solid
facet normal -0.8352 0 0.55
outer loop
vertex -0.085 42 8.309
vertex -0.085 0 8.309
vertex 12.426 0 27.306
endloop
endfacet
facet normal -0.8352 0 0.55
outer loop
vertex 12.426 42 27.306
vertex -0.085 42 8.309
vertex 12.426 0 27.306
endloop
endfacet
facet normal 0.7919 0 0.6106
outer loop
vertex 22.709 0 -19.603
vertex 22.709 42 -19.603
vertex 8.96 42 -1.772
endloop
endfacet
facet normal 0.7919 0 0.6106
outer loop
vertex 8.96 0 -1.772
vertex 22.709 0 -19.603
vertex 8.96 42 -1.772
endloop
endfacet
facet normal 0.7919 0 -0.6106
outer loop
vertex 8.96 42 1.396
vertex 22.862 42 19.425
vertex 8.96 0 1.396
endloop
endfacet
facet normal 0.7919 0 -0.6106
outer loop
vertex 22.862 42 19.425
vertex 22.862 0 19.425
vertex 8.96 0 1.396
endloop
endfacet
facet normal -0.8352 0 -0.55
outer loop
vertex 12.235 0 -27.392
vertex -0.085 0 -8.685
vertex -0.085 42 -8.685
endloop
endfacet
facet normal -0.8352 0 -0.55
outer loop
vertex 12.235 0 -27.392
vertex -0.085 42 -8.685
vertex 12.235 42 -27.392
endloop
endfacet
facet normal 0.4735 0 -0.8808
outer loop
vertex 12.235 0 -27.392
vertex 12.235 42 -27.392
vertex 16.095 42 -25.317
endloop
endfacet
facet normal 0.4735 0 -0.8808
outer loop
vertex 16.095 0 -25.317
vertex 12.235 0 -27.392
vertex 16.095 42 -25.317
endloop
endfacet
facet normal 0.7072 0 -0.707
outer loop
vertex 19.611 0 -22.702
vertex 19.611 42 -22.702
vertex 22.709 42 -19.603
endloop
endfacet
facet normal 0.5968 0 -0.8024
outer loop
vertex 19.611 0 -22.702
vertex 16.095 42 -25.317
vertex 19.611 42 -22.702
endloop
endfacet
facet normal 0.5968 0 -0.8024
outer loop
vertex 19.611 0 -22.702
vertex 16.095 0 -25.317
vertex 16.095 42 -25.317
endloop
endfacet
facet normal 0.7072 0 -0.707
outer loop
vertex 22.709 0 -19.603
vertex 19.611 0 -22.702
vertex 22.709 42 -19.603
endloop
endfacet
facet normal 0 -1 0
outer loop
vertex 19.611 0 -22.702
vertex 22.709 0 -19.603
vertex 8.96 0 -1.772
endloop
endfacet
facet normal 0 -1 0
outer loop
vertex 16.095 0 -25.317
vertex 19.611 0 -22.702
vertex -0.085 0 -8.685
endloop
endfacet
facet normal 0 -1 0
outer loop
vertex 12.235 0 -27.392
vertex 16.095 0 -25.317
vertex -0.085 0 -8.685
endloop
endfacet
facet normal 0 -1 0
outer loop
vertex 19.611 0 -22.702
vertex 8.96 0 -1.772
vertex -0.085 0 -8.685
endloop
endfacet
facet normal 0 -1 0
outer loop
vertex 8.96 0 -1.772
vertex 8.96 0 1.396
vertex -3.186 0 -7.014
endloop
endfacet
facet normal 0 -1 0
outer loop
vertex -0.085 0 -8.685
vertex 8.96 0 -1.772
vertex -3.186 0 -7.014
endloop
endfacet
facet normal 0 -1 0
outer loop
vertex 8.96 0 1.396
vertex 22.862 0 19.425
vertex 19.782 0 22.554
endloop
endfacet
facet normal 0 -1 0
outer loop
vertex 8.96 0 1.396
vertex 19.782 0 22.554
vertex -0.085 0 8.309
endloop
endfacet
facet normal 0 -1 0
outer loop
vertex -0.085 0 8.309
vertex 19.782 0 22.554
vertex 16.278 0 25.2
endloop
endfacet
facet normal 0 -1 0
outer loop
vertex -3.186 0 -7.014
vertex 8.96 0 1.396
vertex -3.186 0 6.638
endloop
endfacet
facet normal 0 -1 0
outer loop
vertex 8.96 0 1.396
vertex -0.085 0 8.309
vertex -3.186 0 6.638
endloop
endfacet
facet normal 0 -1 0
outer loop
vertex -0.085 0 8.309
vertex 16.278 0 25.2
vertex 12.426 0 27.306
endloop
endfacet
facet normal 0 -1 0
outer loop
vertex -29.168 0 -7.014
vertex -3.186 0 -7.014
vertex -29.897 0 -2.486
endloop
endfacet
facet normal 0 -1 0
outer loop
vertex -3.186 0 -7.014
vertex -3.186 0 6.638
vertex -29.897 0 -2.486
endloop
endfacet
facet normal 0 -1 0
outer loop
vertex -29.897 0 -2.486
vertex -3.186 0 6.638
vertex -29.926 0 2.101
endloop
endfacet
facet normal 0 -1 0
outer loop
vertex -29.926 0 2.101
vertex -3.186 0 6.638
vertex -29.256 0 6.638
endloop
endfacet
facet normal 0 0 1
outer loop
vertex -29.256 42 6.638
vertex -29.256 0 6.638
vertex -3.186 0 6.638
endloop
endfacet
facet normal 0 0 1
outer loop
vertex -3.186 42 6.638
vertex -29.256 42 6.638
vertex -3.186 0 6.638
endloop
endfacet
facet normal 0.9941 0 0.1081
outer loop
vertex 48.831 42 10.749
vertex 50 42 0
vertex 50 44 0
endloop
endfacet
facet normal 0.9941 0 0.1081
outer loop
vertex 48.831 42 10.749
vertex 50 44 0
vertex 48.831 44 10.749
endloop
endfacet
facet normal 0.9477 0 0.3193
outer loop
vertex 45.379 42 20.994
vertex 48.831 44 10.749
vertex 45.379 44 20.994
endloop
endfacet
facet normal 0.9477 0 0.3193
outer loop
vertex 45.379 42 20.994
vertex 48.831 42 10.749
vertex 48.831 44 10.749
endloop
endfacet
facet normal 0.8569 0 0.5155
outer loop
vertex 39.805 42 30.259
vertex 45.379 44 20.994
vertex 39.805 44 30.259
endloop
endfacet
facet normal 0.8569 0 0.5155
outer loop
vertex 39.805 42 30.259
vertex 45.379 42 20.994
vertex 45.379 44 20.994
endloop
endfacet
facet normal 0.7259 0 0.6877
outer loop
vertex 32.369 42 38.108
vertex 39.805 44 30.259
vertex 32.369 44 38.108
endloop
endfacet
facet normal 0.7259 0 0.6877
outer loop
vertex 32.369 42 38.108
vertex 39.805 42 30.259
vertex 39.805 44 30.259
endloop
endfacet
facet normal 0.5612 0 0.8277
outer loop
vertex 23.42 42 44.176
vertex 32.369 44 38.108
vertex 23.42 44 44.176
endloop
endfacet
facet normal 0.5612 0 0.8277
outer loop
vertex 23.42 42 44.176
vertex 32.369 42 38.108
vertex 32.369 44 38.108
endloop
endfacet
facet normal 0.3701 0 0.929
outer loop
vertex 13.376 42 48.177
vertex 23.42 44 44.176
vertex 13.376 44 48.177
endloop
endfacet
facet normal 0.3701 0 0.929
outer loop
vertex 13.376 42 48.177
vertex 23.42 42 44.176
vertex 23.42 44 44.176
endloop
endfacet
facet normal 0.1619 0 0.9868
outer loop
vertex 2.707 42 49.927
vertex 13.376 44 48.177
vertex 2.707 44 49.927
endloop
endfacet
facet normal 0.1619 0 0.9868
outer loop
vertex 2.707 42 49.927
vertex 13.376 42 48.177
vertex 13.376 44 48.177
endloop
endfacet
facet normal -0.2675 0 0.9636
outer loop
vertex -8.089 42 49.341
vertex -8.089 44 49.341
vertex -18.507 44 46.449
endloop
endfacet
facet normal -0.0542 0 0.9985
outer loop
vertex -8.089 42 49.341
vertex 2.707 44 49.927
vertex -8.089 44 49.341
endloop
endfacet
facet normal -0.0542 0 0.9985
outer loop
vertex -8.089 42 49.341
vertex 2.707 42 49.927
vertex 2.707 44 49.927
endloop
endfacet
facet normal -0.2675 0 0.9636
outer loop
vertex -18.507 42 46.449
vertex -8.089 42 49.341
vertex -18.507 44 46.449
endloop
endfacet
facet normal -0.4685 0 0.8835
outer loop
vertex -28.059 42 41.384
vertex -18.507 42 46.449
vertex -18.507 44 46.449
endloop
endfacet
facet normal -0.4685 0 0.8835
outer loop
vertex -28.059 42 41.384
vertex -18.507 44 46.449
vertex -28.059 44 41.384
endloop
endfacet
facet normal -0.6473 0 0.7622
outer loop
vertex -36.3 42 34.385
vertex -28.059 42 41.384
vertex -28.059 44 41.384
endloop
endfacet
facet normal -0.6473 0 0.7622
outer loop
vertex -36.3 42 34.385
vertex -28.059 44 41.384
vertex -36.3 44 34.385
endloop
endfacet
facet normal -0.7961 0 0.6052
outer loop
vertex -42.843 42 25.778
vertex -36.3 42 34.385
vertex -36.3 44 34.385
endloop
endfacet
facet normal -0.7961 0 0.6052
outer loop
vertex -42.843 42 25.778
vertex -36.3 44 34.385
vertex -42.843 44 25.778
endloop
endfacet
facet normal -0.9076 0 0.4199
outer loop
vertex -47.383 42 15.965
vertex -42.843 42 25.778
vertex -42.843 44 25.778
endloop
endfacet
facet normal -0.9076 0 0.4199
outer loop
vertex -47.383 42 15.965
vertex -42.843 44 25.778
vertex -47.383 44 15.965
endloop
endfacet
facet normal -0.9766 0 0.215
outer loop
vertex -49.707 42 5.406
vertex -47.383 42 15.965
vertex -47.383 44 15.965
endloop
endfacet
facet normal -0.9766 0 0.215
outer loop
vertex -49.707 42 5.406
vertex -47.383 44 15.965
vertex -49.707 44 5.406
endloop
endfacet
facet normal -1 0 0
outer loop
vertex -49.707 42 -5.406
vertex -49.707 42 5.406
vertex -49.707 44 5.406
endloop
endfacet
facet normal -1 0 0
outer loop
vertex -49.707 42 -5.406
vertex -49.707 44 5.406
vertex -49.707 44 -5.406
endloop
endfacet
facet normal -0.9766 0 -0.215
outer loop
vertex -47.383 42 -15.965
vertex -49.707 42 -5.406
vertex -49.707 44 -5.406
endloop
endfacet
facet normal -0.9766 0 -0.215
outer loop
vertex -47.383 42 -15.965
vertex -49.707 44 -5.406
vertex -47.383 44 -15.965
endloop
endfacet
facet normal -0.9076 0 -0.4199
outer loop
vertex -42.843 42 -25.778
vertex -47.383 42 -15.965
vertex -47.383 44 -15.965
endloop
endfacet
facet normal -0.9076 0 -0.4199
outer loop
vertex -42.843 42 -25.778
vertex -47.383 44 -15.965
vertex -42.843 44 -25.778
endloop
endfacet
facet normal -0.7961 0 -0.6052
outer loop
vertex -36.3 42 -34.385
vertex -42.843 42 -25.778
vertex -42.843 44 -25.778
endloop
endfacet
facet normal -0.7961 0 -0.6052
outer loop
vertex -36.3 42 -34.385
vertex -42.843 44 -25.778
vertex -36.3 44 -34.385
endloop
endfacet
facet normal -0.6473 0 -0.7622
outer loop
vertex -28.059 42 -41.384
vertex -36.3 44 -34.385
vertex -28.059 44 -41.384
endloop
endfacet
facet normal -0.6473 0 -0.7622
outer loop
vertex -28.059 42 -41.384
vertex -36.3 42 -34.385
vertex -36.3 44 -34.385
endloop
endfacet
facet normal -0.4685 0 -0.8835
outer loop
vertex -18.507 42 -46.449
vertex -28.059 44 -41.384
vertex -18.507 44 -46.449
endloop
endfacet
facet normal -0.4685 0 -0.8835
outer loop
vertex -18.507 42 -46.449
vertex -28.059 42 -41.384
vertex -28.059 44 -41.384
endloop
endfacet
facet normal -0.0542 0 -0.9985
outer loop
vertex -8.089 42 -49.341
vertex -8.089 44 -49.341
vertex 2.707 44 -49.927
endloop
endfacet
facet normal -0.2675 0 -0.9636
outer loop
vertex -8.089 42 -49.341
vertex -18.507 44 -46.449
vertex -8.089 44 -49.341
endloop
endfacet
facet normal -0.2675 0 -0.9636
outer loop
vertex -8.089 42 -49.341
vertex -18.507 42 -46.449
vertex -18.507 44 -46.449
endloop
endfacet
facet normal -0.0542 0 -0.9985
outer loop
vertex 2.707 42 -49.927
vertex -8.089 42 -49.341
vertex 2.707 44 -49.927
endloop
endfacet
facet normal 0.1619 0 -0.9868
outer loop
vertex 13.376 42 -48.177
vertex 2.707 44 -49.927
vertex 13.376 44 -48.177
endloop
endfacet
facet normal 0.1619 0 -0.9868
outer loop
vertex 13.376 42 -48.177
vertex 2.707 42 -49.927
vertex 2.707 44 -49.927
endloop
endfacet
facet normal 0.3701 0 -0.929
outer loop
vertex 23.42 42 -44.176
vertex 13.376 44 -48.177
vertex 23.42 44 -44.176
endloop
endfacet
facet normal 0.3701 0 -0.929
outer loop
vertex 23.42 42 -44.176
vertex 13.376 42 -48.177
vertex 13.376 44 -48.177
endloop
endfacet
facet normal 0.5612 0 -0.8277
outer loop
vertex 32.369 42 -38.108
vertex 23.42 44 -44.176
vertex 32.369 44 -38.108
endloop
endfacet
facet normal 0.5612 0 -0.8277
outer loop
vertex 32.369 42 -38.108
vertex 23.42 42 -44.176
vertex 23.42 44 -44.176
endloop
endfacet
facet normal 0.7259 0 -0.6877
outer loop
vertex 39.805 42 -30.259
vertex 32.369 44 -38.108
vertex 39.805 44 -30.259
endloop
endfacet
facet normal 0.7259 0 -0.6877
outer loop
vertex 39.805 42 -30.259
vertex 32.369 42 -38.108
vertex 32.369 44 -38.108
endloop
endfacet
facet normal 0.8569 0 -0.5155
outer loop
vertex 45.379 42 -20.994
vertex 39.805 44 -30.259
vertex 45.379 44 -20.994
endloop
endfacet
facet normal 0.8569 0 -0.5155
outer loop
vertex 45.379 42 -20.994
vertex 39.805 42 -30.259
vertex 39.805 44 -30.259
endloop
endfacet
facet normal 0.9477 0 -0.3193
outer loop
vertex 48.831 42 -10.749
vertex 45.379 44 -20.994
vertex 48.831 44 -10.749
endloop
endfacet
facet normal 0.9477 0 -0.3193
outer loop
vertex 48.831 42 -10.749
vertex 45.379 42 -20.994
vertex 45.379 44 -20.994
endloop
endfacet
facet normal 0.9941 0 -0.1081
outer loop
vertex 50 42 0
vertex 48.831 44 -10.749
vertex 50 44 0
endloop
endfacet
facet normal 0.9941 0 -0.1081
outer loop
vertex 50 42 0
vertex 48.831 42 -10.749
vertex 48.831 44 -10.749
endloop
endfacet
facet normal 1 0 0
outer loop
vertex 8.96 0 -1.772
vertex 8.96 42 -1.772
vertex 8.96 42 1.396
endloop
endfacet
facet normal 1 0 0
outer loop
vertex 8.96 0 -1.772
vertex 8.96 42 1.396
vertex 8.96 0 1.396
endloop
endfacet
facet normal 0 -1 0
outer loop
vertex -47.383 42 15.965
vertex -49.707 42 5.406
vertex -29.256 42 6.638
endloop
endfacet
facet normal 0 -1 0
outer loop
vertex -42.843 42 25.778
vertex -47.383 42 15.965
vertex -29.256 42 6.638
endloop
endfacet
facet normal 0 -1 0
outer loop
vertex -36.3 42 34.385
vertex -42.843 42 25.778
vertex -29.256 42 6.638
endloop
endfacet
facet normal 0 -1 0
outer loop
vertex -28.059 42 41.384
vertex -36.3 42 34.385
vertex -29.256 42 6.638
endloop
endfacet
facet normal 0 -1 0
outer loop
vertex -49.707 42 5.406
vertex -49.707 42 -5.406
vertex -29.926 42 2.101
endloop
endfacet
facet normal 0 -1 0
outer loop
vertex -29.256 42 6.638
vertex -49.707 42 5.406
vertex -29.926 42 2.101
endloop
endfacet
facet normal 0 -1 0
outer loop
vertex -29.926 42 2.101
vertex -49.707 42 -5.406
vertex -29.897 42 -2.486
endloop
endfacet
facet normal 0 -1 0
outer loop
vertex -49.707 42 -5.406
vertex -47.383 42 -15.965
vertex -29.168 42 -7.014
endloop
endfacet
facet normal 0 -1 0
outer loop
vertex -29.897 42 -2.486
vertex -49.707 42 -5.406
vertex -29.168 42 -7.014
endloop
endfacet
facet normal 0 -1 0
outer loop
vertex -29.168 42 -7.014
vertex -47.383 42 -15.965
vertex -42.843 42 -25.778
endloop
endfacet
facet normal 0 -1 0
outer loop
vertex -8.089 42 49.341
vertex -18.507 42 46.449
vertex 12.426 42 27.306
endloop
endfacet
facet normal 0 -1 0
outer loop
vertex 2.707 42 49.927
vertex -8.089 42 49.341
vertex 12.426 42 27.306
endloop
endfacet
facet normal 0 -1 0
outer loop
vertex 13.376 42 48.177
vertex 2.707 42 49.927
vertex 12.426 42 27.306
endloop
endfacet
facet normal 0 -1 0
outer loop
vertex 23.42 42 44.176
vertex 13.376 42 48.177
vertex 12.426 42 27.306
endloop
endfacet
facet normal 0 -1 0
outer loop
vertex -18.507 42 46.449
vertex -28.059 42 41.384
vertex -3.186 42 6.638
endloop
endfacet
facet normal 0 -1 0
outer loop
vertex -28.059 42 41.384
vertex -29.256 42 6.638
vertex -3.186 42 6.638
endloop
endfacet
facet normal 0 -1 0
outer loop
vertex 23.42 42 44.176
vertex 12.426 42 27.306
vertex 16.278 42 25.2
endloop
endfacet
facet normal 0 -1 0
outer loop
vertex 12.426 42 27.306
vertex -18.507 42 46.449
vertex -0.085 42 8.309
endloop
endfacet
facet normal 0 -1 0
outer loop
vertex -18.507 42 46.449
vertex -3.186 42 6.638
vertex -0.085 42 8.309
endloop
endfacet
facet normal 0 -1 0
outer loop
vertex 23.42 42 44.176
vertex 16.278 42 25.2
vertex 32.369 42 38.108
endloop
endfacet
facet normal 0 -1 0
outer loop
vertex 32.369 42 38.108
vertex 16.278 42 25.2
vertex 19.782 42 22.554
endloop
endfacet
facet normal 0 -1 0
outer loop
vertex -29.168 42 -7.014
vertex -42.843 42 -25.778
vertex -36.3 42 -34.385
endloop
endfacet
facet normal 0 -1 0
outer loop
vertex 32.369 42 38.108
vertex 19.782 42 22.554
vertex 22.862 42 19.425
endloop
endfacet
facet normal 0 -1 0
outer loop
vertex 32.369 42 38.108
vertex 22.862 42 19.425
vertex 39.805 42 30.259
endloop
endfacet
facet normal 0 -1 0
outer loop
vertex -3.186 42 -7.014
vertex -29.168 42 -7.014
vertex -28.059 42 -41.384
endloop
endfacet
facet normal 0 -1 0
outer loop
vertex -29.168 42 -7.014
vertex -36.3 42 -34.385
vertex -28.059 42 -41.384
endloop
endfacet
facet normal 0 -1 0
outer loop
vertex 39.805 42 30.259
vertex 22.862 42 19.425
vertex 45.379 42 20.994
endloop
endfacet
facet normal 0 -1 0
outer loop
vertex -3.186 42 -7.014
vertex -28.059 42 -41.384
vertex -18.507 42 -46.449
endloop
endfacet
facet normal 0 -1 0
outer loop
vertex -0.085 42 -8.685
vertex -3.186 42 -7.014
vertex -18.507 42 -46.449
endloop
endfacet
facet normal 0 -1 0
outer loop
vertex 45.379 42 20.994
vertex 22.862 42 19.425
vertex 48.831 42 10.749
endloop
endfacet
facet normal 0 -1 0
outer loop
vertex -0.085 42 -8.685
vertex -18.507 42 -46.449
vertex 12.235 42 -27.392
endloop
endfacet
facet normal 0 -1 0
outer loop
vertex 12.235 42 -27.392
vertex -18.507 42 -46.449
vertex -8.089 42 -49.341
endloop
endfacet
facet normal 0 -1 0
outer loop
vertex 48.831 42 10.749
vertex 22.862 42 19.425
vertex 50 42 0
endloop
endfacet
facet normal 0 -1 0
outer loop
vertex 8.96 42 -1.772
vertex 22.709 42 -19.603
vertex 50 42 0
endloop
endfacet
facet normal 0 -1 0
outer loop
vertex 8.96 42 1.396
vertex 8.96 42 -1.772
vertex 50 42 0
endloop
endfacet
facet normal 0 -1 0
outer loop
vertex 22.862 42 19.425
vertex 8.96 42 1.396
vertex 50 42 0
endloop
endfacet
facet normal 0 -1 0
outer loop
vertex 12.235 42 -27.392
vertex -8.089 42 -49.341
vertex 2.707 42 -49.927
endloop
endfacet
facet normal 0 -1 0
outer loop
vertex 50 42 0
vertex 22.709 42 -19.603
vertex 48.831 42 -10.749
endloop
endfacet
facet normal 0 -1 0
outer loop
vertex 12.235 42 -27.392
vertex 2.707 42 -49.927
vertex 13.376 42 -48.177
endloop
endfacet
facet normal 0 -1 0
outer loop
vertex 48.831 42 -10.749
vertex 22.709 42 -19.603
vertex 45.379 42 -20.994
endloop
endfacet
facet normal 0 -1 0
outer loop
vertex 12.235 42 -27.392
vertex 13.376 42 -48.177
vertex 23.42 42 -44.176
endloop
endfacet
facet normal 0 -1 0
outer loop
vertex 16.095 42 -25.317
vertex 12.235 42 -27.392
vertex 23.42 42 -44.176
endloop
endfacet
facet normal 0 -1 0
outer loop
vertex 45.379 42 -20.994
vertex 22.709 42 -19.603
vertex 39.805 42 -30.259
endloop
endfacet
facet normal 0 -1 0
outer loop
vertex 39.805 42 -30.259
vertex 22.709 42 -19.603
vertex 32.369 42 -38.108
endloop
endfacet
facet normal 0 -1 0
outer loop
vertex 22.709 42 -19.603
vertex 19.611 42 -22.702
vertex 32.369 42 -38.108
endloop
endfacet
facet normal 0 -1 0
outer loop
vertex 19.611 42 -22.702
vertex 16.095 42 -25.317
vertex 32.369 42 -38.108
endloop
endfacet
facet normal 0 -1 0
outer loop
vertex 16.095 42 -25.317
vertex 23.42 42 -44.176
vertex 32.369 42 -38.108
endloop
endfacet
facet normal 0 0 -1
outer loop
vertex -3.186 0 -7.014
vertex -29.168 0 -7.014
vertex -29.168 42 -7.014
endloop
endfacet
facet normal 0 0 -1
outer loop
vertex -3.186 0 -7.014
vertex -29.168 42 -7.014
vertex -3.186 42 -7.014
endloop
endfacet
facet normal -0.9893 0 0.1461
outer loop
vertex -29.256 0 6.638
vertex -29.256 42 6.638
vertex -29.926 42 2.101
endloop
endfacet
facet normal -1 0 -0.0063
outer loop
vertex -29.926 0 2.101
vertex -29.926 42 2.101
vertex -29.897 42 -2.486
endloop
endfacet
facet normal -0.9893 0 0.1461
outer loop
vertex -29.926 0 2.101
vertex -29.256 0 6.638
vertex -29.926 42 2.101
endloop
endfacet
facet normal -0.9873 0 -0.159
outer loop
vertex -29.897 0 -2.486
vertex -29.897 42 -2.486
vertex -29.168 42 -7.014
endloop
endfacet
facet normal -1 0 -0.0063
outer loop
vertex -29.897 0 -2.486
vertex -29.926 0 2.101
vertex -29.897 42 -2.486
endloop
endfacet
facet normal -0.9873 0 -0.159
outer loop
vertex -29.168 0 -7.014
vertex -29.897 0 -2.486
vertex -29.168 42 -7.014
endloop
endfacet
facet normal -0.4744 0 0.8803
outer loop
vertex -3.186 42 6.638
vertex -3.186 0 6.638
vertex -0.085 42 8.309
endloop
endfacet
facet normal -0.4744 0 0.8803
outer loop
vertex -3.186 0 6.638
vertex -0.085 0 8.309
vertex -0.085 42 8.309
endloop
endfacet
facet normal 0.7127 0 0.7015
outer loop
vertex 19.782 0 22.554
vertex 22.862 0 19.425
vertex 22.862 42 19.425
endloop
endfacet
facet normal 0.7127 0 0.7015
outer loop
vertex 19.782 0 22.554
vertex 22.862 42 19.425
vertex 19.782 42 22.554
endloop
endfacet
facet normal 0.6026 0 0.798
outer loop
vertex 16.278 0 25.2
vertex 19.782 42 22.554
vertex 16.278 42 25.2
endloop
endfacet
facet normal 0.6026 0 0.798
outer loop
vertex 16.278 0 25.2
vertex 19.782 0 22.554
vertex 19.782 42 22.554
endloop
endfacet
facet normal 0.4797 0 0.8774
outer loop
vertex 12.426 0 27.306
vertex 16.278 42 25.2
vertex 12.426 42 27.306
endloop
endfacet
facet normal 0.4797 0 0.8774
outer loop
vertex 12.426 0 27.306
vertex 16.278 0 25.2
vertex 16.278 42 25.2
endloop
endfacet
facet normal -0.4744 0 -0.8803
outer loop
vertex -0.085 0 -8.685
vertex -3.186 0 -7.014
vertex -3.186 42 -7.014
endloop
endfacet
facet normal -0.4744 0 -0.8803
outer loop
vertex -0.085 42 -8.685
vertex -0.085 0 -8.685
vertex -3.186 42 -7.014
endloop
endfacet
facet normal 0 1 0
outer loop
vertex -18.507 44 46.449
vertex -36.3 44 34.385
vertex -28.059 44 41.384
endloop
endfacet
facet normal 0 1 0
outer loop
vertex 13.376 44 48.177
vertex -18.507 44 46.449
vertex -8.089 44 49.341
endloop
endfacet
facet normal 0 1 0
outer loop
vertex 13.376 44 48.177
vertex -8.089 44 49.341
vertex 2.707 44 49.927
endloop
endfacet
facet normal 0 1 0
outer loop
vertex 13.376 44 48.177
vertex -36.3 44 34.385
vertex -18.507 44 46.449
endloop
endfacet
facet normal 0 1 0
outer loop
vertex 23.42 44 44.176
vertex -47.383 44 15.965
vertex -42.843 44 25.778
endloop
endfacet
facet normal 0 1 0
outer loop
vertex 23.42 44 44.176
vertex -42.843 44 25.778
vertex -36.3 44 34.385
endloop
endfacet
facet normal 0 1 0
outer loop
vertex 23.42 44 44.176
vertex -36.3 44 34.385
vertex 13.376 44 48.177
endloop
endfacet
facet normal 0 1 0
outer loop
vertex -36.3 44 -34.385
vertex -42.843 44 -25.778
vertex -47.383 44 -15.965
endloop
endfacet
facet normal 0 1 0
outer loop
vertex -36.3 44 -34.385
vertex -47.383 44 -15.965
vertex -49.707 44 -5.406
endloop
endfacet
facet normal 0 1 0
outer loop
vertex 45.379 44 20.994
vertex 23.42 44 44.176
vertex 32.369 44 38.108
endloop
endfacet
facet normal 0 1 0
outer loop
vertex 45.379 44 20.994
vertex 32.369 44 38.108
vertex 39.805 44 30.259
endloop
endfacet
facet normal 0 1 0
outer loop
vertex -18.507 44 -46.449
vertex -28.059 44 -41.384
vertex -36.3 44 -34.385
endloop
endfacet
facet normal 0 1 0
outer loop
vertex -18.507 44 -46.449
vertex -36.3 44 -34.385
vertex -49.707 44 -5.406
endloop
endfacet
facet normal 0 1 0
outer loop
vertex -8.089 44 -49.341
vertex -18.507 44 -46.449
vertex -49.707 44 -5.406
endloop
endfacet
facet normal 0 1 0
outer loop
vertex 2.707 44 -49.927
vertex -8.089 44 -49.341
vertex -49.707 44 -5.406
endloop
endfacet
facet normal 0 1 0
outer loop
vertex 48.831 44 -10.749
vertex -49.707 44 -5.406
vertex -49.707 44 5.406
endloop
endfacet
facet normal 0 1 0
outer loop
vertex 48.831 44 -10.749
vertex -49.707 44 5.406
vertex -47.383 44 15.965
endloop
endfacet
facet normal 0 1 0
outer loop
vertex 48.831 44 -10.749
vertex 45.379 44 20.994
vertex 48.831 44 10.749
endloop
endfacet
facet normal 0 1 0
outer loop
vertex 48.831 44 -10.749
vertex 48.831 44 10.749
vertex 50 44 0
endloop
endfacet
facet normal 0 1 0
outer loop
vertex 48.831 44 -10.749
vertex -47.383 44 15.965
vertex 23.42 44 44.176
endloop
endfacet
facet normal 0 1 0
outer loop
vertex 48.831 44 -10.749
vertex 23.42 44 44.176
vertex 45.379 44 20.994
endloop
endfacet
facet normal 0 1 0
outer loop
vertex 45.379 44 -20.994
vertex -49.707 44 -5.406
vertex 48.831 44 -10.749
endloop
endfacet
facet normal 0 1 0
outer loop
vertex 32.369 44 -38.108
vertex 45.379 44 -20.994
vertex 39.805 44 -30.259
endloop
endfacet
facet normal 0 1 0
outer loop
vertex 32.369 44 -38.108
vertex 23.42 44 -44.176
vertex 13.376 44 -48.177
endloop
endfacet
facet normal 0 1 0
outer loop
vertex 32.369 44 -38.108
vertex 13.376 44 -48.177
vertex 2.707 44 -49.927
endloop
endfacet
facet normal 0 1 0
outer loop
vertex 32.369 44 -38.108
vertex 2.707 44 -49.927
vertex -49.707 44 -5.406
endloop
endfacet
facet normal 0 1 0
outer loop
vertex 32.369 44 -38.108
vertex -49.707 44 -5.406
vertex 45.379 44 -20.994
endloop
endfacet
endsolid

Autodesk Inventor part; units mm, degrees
ref_plane "YZ Plane" through (0, 0, 0) normal (1, 0, 0) x (0, 1, 0)
ref_plane "XZ Plane" through (0, 0, 0) normal (0, 1, 0) x (-1, 0, 0)
ref_plane "XY Plane" through (0, 0, 0) normal (0, 0, 1) x (1, 0, 0)
sketch "Esboço1" plane through (0, 0, 0) normal (0, 1, 0) x (-1, 0, 0)
  circle A0 centre (0, 0) radius 30
  line L0 (29.2563, 6.6384) -> (1.1855, 6.6384)
  line L1 (1.1855, 6.6384) -> (-12.4256, 27.3058)
  line L2 (-22.8619, 19.4251) -> (-7.7387, -0.1879)
  line L3 (29.9994, -0.1879) -> (-29.9994, -0.1879) construction
  line L4 (29.2563, -7.0142) -> (1.1855, -7.0142)
  line L5 (1.1855, -7.0142) -> (-12.4256, -27.6816)
  line L6 (-22.8619, -19.8009) -> (-7.7387, -0.1879)
  point P0 (29.2563, -6.6384)
  point P1 (-23.0884, -19.1553)
  point P2 (-22.7094, -19.6031)
  point P3 (29.1685, -7.0142)
  point P4 (-12.2347, -27.3918)
  dimension "d0" = 60
extrude "Extrusão1" add sketch "Esboço1" along normal blind 42 contours A0 L4 L5 L6 L2 L1 L0
sketch "Esboço2" plane through (0, 42, 0) normal (0, 1, 0) x (1, 0, 0)
  circle A0 centre (0, 0) radius 50
  dimension "d3" = 100
extrude "Extrusão2" add sketch "Esboço2" along normal blind 2
chamfer "Chanfro1" distance 2 angle 45 3 edges at (-1.1855, 21, -7.0142) (-1.1855, 21, 6.6384) (7.7387, 21, -0.1879)
sketch "Esboço3" plane through (12.2347, 0, -27.3918) normal (-0.8352, 0, -0.55) x (-0.55, 0, 0.8352)
  line L0 (23.1979, 0) -> (0.7435, 0) projected
  line L1 (79.6057, 44) -> (-20.3943, 44) projected
  point P0 (29.6057, 0)
  dimension "d10" = 44
